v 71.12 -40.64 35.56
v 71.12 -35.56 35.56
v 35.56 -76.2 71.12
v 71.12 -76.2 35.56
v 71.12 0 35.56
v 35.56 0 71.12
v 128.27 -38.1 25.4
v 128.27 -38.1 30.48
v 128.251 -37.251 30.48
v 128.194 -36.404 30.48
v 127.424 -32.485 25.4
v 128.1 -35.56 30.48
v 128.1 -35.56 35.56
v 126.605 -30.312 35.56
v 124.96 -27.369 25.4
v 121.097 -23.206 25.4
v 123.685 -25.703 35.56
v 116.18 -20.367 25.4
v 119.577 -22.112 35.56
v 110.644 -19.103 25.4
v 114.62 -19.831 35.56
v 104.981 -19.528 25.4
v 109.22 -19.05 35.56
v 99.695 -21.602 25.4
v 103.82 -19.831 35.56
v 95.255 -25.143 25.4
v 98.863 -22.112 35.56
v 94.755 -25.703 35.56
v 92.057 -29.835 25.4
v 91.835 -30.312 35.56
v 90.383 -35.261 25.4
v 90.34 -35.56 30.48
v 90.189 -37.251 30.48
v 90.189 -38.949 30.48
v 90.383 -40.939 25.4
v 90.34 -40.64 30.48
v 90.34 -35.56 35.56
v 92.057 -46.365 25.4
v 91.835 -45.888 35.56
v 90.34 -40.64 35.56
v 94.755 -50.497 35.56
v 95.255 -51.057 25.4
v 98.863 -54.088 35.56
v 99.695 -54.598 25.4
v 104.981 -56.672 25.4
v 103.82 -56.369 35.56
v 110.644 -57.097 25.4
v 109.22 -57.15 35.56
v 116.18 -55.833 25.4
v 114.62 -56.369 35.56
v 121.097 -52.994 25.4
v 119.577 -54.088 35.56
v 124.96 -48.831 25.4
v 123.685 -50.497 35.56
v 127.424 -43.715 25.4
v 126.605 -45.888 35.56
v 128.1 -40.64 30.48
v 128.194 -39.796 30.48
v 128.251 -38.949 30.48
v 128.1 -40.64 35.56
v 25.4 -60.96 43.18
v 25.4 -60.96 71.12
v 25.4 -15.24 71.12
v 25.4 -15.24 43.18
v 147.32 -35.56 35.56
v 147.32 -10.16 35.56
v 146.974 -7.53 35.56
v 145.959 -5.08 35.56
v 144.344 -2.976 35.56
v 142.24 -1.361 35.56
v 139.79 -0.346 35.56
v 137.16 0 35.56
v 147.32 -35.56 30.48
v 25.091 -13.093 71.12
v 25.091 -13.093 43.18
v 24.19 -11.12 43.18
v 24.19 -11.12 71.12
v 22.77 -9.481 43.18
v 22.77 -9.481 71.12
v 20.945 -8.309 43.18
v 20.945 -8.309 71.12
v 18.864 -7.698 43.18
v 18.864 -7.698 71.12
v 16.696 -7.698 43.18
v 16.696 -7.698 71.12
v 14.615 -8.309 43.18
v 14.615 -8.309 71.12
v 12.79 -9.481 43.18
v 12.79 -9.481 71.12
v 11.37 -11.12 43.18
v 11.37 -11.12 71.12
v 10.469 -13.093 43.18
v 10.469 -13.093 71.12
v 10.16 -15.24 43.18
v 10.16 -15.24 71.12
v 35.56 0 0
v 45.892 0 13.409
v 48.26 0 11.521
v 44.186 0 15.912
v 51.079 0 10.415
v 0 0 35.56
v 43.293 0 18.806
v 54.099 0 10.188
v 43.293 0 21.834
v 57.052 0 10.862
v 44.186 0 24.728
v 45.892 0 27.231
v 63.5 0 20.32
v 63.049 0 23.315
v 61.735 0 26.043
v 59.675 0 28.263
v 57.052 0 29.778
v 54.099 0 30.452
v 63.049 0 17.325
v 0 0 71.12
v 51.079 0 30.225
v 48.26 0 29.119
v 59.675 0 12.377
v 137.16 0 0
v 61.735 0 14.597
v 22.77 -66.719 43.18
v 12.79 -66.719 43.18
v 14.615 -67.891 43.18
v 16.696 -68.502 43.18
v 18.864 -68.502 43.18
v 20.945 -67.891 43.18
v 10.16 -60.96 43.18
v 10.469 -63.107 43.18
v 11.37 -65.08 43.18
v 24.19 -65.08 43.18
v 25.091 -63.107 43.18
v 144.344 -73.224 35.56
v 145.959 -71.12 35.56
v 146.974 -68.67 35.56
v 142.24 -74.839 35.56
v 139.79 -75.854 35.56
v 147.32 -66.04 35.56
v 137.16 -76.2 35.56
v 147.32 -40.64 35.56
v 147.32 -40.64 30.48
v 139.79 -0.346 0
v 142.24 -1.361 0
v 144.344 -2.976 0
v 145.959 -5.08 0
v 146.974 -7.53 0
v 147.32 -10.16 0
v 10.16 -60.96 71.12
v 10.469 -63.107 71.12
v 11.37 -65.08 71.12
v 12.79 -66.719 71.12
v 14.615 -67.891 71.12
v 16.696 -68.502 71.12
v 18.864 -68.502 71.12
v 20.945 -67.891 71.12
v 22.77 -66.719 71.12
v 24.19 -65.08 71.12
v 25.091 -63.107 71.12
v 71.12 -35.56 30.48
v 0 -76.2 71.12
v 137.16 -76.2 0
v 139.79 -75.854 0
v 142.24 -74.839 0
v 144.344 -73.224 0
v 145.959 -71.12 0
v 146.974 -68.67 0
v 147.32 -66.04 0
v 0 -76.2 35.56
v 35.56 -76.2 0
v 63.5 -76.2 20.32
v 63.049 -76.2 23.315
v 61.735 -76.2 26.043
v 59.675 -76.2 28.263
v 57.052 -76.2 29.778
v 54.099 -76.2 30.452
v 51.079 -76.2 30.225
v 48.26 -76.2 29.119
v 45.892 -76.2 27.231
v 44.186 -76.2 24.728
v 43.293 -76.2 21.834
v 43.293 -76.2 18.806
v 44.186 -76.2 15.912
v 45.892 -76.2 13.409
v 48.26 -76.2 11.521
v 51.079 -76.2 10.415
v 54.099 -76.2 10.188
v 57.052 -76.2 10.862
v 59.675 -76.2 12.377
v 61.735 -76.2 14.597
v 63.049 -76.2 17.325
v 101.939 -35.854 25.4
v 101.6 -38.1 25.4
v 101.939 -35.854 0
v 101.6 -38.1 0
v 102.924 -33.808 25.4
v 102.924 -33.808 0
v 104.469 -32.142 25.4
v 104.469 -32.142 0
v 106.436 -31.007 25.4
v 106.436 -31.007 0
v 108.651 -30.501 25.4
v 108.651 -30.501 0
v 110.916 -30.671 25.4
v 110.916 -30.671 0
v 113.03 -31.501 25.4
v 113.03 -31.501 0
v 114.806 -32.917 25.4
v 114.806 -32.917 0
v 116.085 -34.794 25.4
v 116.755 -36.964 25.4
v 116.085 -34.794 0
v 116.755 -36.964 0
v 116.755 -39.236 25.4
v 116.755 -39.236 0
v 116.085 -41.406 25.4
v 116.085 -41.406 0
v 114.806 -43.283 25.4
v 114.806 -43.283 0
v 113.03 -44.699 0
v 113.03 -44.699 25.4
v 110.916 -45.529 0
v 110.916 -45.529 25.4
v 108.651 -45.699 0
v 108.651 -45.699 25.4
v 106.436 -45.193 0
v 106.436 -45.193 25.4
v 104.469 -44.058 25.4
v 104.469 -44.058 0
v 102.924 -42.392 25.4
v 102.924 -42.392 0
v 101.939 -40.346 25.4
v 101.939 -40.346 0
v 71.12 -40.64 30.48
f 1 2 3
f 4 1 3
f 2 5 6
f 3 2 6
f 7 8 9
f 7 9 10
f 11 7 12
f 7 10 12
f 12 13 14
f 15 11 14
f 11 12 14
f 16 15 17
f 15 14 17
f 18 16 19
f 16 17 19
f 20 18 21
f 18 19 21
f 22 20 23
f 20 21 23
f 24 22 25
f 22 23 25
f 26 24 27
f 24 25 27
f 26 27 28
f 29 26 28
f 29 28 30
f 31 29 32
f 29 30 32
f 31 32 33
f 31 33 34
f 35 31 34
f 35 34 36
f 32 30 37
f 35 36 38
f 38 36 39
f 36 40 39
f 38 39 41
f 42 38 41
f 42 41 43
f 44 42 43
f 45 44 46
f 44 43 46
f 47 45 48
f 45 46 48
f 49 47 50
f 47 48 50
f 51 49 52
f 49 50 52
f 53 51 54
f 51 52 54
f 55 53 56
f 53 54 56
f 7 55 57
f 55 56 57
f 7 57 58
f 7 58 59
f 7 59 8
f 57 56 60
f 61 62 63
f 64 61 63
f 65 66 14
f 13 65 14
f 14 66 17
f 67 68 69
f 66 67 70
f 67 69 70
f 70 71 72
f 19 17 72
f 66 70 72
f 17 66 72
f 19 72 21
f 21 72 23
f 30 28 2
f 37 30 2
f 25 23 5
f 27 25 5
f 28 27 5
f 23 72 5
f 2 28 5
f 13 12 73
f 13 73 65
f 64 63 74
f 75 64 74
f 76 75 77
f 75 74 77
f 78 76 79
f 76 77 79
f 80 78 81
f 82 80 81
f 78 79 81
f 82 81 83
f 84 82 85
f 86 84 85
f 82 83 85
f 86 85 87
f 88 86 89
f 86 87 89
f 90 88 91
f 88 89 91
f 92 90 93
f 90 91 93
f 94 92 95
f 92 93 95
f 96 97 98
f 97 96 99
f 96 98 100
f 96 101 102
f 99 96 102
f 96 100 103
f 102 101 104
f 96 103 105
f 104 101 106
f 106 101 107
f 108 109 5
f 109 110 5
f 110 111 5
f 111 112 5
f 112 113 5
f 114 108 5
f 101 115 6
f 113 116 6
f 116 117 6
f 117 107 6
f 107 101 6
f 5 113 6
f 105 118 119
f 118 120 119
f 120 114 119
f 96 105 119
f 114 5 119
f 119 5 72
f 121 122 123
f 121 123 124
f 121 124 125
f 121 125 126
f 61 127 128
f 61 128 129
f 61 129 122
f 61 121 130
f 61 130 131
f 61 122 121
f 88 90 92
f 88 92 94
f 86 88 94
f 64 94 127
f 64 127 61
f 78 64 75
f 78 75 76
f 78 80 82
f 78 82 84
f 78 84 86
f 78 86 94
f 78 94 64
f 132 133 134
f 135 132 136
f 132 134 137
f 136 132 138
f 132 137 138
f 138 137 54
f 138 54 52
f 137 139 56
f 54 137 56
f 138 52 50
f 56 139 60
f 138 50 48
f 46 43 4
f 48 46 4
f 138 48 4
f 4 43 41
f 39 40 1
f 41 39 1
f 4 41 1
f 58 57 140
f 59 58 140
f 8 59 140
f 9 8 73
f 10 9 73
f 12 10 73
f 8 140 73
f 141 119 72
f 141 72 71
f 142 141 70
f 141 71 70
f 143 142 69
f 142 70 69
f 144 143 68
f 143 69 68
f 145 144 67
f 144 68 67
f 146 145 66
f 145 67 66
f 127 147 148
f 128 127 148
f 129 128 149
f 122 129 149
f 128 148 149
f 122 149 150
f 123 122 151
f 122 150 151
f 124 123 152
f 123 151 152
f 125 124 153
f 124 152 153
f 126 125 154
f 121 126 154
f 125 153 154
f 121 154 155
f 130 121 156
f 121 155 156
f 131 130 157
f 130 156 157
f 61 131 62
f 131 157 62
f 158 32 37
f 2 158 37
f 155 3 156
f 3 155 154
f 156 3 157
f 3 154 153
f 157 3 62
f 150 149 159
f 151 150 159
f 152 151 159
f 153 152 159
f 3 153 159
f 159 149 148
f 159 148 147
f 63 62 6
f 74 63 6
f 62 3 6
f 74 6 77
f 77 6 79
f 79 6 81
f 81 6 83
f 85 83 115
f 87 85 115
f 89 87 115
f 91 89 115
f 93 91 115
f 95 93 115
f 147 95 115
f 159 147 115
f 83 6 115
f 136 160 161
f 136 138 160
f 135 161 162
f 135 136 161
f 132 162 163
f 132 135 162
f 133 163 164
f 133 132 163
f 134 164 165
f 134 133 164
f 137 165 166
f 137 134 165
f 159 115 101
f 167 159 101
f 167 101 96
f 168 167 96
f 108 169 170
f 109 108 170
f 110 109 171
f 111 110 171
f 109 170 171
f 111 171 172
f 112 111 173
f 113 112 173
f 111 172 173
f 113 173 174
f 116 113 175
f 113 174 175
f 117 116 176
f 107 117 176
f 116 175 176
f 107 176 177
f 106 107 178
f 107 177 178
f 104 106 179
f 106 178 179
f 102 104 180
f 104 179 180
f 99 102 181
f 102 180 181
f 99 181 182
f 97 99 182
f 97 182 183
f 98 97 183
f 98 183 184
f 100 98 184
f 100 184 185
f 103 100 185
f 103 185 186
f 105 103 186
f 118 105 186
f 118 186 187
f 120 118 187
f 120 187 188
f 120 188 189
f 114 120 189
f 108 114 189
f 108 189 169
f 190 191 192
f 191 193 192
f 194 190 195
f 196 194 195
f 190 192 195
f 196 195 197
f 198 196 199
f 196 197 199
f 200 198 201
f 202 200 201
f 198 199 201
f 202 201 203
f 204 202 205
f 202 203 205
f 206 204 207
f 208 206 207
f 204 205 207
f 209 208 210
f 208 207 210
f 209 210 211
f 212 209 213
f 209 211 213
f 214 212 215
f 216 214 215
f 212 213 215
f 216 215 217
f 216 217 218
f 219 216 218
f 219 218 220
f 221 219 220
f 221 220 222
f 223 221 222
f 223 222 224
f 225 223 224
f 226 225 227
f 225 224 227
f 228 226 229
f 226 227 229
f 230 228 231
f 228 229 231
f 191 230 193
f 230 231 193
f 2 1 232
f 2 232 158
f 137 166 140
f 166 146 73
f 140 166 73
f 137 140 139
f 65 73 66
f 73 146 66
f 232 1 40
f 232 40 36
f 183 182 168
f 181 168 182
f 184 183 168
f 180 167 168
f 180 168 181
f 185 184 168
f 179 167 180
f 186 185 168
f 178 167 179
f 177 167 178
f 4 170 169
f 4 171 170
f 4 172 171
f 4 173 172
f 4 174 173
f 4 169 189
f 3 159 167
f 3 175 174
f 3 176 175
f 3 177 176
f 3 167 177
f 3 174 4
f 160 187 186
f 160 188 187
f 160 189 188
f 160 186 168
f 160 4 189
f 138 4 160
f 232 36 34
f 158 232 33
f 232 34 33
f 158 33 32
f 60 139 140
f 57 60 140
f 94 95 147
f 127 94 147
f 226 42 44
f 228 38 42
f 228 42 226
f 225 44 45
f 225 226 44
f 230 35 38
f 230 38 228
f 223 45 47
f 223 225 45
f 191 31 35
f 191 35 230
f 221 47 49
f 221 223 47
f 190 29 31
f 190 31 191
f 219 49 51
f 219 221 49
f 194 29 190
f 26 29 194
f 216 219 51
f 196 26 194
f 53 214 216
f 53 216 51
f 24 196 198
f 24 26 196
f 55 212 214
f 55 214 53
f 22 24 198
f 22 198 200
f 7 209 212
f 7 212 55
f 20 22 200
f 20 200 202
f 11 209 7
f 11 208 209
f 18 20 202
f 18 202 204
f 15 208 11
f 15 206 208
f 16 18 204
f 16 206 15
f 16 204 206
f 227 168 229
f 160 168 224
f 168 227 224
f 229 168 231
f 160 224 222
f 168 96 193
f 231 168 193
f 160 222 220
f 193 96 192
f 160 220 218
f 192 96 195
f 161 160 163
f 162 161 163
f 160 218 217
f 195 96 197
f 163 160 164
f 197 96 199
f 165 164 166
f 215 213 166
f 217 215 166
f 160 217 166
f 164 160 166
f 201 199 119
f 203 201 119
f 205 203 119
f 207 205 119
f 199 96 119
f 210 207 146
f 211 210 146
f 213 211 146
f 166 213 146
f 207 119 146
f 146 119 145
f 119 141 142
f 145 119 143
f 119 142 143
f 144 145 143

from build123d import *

# Parameters (mm, degrees)
F1_DEPTH       = 76.2
F2_R           = 10.16
F3_DEPTH       = 76.201
F5_DEPTH       = 27.94
F7_D           = 15.24
F7_CBORE_D     = 38.1
F7_CBORE_DEPTH = 10.16
F9_DEPTH       = 76.2
F10_R          = 10.16


with BuildPart() as f1:
    # F0 (on Front) → F1 (new body)
    with BuildSketch(Plane.XZ):
        Polygon((0, 71.12), (0, 35.56), (35.56, 0), (147.32, 0), (147.32, 35.56), (71.12, 35.56), (35.56, 71.12), align=None)
    extrude(amount=F1_DEPTH)

    # F2 (on face) → F3 (cut, through all)
    with BuildSketch(Plane.XZ.offset(76.2)):
        with Locations((53.34, 20.32)):
            Circle(F2_R)
    extrude(amount=-F3_DEPTH, mode=Mode.SUBTRACT)

    # F4 (on face) → F5 (cut)
    with BuildSketch(Plane.XY.offset(71.12)):
        with BuildLine():
            ThreePointArc((25.4, -15.24), (17.78, -7.62), (10.16, -15.24))
            Line((10.16, -15.24), (10.16, -60.96))
            ThreePointArc((10.16, -60.96), (17.78, -68.58), (25.4, -60.96))
            Line((25.4, -60.96), (25.4, -15.24))
        make_face()
    extrude(amount=-F5_DEPTH, mode=Mode.SUBTRACT)

    # F7 (through all)
    with Locations(Plane.XY.offset(35.56)):
        with Locations((109.22, -38.1)):
            CounterBoreHole(F7_D / 2, F7_CBORE_D / 2, F7_CBORE_DEPTH)

    # F8 (on face) → F9 (cut)
    with BuildSketch(Plane.YZ.offset(147.32)):
        Polygon((-35.56, 35.56), (-38.1, 35.56), (-40.64, 35.56), (-40.64, 30.48), (-35.56, 30.48), align=None)
    extrude(amount=-F9_DEPTH, mode=Mode.SUBTRACT)

    # F10
    f10_edges = [f1.edges().sort_by_distance(p)[0] for p in [
        (147.32, 0, 17.78),
        (147.32, -76.2, 17.78),
    ]]
    fillet(f10_edges, radius=F10_R)


solid = f1.part
